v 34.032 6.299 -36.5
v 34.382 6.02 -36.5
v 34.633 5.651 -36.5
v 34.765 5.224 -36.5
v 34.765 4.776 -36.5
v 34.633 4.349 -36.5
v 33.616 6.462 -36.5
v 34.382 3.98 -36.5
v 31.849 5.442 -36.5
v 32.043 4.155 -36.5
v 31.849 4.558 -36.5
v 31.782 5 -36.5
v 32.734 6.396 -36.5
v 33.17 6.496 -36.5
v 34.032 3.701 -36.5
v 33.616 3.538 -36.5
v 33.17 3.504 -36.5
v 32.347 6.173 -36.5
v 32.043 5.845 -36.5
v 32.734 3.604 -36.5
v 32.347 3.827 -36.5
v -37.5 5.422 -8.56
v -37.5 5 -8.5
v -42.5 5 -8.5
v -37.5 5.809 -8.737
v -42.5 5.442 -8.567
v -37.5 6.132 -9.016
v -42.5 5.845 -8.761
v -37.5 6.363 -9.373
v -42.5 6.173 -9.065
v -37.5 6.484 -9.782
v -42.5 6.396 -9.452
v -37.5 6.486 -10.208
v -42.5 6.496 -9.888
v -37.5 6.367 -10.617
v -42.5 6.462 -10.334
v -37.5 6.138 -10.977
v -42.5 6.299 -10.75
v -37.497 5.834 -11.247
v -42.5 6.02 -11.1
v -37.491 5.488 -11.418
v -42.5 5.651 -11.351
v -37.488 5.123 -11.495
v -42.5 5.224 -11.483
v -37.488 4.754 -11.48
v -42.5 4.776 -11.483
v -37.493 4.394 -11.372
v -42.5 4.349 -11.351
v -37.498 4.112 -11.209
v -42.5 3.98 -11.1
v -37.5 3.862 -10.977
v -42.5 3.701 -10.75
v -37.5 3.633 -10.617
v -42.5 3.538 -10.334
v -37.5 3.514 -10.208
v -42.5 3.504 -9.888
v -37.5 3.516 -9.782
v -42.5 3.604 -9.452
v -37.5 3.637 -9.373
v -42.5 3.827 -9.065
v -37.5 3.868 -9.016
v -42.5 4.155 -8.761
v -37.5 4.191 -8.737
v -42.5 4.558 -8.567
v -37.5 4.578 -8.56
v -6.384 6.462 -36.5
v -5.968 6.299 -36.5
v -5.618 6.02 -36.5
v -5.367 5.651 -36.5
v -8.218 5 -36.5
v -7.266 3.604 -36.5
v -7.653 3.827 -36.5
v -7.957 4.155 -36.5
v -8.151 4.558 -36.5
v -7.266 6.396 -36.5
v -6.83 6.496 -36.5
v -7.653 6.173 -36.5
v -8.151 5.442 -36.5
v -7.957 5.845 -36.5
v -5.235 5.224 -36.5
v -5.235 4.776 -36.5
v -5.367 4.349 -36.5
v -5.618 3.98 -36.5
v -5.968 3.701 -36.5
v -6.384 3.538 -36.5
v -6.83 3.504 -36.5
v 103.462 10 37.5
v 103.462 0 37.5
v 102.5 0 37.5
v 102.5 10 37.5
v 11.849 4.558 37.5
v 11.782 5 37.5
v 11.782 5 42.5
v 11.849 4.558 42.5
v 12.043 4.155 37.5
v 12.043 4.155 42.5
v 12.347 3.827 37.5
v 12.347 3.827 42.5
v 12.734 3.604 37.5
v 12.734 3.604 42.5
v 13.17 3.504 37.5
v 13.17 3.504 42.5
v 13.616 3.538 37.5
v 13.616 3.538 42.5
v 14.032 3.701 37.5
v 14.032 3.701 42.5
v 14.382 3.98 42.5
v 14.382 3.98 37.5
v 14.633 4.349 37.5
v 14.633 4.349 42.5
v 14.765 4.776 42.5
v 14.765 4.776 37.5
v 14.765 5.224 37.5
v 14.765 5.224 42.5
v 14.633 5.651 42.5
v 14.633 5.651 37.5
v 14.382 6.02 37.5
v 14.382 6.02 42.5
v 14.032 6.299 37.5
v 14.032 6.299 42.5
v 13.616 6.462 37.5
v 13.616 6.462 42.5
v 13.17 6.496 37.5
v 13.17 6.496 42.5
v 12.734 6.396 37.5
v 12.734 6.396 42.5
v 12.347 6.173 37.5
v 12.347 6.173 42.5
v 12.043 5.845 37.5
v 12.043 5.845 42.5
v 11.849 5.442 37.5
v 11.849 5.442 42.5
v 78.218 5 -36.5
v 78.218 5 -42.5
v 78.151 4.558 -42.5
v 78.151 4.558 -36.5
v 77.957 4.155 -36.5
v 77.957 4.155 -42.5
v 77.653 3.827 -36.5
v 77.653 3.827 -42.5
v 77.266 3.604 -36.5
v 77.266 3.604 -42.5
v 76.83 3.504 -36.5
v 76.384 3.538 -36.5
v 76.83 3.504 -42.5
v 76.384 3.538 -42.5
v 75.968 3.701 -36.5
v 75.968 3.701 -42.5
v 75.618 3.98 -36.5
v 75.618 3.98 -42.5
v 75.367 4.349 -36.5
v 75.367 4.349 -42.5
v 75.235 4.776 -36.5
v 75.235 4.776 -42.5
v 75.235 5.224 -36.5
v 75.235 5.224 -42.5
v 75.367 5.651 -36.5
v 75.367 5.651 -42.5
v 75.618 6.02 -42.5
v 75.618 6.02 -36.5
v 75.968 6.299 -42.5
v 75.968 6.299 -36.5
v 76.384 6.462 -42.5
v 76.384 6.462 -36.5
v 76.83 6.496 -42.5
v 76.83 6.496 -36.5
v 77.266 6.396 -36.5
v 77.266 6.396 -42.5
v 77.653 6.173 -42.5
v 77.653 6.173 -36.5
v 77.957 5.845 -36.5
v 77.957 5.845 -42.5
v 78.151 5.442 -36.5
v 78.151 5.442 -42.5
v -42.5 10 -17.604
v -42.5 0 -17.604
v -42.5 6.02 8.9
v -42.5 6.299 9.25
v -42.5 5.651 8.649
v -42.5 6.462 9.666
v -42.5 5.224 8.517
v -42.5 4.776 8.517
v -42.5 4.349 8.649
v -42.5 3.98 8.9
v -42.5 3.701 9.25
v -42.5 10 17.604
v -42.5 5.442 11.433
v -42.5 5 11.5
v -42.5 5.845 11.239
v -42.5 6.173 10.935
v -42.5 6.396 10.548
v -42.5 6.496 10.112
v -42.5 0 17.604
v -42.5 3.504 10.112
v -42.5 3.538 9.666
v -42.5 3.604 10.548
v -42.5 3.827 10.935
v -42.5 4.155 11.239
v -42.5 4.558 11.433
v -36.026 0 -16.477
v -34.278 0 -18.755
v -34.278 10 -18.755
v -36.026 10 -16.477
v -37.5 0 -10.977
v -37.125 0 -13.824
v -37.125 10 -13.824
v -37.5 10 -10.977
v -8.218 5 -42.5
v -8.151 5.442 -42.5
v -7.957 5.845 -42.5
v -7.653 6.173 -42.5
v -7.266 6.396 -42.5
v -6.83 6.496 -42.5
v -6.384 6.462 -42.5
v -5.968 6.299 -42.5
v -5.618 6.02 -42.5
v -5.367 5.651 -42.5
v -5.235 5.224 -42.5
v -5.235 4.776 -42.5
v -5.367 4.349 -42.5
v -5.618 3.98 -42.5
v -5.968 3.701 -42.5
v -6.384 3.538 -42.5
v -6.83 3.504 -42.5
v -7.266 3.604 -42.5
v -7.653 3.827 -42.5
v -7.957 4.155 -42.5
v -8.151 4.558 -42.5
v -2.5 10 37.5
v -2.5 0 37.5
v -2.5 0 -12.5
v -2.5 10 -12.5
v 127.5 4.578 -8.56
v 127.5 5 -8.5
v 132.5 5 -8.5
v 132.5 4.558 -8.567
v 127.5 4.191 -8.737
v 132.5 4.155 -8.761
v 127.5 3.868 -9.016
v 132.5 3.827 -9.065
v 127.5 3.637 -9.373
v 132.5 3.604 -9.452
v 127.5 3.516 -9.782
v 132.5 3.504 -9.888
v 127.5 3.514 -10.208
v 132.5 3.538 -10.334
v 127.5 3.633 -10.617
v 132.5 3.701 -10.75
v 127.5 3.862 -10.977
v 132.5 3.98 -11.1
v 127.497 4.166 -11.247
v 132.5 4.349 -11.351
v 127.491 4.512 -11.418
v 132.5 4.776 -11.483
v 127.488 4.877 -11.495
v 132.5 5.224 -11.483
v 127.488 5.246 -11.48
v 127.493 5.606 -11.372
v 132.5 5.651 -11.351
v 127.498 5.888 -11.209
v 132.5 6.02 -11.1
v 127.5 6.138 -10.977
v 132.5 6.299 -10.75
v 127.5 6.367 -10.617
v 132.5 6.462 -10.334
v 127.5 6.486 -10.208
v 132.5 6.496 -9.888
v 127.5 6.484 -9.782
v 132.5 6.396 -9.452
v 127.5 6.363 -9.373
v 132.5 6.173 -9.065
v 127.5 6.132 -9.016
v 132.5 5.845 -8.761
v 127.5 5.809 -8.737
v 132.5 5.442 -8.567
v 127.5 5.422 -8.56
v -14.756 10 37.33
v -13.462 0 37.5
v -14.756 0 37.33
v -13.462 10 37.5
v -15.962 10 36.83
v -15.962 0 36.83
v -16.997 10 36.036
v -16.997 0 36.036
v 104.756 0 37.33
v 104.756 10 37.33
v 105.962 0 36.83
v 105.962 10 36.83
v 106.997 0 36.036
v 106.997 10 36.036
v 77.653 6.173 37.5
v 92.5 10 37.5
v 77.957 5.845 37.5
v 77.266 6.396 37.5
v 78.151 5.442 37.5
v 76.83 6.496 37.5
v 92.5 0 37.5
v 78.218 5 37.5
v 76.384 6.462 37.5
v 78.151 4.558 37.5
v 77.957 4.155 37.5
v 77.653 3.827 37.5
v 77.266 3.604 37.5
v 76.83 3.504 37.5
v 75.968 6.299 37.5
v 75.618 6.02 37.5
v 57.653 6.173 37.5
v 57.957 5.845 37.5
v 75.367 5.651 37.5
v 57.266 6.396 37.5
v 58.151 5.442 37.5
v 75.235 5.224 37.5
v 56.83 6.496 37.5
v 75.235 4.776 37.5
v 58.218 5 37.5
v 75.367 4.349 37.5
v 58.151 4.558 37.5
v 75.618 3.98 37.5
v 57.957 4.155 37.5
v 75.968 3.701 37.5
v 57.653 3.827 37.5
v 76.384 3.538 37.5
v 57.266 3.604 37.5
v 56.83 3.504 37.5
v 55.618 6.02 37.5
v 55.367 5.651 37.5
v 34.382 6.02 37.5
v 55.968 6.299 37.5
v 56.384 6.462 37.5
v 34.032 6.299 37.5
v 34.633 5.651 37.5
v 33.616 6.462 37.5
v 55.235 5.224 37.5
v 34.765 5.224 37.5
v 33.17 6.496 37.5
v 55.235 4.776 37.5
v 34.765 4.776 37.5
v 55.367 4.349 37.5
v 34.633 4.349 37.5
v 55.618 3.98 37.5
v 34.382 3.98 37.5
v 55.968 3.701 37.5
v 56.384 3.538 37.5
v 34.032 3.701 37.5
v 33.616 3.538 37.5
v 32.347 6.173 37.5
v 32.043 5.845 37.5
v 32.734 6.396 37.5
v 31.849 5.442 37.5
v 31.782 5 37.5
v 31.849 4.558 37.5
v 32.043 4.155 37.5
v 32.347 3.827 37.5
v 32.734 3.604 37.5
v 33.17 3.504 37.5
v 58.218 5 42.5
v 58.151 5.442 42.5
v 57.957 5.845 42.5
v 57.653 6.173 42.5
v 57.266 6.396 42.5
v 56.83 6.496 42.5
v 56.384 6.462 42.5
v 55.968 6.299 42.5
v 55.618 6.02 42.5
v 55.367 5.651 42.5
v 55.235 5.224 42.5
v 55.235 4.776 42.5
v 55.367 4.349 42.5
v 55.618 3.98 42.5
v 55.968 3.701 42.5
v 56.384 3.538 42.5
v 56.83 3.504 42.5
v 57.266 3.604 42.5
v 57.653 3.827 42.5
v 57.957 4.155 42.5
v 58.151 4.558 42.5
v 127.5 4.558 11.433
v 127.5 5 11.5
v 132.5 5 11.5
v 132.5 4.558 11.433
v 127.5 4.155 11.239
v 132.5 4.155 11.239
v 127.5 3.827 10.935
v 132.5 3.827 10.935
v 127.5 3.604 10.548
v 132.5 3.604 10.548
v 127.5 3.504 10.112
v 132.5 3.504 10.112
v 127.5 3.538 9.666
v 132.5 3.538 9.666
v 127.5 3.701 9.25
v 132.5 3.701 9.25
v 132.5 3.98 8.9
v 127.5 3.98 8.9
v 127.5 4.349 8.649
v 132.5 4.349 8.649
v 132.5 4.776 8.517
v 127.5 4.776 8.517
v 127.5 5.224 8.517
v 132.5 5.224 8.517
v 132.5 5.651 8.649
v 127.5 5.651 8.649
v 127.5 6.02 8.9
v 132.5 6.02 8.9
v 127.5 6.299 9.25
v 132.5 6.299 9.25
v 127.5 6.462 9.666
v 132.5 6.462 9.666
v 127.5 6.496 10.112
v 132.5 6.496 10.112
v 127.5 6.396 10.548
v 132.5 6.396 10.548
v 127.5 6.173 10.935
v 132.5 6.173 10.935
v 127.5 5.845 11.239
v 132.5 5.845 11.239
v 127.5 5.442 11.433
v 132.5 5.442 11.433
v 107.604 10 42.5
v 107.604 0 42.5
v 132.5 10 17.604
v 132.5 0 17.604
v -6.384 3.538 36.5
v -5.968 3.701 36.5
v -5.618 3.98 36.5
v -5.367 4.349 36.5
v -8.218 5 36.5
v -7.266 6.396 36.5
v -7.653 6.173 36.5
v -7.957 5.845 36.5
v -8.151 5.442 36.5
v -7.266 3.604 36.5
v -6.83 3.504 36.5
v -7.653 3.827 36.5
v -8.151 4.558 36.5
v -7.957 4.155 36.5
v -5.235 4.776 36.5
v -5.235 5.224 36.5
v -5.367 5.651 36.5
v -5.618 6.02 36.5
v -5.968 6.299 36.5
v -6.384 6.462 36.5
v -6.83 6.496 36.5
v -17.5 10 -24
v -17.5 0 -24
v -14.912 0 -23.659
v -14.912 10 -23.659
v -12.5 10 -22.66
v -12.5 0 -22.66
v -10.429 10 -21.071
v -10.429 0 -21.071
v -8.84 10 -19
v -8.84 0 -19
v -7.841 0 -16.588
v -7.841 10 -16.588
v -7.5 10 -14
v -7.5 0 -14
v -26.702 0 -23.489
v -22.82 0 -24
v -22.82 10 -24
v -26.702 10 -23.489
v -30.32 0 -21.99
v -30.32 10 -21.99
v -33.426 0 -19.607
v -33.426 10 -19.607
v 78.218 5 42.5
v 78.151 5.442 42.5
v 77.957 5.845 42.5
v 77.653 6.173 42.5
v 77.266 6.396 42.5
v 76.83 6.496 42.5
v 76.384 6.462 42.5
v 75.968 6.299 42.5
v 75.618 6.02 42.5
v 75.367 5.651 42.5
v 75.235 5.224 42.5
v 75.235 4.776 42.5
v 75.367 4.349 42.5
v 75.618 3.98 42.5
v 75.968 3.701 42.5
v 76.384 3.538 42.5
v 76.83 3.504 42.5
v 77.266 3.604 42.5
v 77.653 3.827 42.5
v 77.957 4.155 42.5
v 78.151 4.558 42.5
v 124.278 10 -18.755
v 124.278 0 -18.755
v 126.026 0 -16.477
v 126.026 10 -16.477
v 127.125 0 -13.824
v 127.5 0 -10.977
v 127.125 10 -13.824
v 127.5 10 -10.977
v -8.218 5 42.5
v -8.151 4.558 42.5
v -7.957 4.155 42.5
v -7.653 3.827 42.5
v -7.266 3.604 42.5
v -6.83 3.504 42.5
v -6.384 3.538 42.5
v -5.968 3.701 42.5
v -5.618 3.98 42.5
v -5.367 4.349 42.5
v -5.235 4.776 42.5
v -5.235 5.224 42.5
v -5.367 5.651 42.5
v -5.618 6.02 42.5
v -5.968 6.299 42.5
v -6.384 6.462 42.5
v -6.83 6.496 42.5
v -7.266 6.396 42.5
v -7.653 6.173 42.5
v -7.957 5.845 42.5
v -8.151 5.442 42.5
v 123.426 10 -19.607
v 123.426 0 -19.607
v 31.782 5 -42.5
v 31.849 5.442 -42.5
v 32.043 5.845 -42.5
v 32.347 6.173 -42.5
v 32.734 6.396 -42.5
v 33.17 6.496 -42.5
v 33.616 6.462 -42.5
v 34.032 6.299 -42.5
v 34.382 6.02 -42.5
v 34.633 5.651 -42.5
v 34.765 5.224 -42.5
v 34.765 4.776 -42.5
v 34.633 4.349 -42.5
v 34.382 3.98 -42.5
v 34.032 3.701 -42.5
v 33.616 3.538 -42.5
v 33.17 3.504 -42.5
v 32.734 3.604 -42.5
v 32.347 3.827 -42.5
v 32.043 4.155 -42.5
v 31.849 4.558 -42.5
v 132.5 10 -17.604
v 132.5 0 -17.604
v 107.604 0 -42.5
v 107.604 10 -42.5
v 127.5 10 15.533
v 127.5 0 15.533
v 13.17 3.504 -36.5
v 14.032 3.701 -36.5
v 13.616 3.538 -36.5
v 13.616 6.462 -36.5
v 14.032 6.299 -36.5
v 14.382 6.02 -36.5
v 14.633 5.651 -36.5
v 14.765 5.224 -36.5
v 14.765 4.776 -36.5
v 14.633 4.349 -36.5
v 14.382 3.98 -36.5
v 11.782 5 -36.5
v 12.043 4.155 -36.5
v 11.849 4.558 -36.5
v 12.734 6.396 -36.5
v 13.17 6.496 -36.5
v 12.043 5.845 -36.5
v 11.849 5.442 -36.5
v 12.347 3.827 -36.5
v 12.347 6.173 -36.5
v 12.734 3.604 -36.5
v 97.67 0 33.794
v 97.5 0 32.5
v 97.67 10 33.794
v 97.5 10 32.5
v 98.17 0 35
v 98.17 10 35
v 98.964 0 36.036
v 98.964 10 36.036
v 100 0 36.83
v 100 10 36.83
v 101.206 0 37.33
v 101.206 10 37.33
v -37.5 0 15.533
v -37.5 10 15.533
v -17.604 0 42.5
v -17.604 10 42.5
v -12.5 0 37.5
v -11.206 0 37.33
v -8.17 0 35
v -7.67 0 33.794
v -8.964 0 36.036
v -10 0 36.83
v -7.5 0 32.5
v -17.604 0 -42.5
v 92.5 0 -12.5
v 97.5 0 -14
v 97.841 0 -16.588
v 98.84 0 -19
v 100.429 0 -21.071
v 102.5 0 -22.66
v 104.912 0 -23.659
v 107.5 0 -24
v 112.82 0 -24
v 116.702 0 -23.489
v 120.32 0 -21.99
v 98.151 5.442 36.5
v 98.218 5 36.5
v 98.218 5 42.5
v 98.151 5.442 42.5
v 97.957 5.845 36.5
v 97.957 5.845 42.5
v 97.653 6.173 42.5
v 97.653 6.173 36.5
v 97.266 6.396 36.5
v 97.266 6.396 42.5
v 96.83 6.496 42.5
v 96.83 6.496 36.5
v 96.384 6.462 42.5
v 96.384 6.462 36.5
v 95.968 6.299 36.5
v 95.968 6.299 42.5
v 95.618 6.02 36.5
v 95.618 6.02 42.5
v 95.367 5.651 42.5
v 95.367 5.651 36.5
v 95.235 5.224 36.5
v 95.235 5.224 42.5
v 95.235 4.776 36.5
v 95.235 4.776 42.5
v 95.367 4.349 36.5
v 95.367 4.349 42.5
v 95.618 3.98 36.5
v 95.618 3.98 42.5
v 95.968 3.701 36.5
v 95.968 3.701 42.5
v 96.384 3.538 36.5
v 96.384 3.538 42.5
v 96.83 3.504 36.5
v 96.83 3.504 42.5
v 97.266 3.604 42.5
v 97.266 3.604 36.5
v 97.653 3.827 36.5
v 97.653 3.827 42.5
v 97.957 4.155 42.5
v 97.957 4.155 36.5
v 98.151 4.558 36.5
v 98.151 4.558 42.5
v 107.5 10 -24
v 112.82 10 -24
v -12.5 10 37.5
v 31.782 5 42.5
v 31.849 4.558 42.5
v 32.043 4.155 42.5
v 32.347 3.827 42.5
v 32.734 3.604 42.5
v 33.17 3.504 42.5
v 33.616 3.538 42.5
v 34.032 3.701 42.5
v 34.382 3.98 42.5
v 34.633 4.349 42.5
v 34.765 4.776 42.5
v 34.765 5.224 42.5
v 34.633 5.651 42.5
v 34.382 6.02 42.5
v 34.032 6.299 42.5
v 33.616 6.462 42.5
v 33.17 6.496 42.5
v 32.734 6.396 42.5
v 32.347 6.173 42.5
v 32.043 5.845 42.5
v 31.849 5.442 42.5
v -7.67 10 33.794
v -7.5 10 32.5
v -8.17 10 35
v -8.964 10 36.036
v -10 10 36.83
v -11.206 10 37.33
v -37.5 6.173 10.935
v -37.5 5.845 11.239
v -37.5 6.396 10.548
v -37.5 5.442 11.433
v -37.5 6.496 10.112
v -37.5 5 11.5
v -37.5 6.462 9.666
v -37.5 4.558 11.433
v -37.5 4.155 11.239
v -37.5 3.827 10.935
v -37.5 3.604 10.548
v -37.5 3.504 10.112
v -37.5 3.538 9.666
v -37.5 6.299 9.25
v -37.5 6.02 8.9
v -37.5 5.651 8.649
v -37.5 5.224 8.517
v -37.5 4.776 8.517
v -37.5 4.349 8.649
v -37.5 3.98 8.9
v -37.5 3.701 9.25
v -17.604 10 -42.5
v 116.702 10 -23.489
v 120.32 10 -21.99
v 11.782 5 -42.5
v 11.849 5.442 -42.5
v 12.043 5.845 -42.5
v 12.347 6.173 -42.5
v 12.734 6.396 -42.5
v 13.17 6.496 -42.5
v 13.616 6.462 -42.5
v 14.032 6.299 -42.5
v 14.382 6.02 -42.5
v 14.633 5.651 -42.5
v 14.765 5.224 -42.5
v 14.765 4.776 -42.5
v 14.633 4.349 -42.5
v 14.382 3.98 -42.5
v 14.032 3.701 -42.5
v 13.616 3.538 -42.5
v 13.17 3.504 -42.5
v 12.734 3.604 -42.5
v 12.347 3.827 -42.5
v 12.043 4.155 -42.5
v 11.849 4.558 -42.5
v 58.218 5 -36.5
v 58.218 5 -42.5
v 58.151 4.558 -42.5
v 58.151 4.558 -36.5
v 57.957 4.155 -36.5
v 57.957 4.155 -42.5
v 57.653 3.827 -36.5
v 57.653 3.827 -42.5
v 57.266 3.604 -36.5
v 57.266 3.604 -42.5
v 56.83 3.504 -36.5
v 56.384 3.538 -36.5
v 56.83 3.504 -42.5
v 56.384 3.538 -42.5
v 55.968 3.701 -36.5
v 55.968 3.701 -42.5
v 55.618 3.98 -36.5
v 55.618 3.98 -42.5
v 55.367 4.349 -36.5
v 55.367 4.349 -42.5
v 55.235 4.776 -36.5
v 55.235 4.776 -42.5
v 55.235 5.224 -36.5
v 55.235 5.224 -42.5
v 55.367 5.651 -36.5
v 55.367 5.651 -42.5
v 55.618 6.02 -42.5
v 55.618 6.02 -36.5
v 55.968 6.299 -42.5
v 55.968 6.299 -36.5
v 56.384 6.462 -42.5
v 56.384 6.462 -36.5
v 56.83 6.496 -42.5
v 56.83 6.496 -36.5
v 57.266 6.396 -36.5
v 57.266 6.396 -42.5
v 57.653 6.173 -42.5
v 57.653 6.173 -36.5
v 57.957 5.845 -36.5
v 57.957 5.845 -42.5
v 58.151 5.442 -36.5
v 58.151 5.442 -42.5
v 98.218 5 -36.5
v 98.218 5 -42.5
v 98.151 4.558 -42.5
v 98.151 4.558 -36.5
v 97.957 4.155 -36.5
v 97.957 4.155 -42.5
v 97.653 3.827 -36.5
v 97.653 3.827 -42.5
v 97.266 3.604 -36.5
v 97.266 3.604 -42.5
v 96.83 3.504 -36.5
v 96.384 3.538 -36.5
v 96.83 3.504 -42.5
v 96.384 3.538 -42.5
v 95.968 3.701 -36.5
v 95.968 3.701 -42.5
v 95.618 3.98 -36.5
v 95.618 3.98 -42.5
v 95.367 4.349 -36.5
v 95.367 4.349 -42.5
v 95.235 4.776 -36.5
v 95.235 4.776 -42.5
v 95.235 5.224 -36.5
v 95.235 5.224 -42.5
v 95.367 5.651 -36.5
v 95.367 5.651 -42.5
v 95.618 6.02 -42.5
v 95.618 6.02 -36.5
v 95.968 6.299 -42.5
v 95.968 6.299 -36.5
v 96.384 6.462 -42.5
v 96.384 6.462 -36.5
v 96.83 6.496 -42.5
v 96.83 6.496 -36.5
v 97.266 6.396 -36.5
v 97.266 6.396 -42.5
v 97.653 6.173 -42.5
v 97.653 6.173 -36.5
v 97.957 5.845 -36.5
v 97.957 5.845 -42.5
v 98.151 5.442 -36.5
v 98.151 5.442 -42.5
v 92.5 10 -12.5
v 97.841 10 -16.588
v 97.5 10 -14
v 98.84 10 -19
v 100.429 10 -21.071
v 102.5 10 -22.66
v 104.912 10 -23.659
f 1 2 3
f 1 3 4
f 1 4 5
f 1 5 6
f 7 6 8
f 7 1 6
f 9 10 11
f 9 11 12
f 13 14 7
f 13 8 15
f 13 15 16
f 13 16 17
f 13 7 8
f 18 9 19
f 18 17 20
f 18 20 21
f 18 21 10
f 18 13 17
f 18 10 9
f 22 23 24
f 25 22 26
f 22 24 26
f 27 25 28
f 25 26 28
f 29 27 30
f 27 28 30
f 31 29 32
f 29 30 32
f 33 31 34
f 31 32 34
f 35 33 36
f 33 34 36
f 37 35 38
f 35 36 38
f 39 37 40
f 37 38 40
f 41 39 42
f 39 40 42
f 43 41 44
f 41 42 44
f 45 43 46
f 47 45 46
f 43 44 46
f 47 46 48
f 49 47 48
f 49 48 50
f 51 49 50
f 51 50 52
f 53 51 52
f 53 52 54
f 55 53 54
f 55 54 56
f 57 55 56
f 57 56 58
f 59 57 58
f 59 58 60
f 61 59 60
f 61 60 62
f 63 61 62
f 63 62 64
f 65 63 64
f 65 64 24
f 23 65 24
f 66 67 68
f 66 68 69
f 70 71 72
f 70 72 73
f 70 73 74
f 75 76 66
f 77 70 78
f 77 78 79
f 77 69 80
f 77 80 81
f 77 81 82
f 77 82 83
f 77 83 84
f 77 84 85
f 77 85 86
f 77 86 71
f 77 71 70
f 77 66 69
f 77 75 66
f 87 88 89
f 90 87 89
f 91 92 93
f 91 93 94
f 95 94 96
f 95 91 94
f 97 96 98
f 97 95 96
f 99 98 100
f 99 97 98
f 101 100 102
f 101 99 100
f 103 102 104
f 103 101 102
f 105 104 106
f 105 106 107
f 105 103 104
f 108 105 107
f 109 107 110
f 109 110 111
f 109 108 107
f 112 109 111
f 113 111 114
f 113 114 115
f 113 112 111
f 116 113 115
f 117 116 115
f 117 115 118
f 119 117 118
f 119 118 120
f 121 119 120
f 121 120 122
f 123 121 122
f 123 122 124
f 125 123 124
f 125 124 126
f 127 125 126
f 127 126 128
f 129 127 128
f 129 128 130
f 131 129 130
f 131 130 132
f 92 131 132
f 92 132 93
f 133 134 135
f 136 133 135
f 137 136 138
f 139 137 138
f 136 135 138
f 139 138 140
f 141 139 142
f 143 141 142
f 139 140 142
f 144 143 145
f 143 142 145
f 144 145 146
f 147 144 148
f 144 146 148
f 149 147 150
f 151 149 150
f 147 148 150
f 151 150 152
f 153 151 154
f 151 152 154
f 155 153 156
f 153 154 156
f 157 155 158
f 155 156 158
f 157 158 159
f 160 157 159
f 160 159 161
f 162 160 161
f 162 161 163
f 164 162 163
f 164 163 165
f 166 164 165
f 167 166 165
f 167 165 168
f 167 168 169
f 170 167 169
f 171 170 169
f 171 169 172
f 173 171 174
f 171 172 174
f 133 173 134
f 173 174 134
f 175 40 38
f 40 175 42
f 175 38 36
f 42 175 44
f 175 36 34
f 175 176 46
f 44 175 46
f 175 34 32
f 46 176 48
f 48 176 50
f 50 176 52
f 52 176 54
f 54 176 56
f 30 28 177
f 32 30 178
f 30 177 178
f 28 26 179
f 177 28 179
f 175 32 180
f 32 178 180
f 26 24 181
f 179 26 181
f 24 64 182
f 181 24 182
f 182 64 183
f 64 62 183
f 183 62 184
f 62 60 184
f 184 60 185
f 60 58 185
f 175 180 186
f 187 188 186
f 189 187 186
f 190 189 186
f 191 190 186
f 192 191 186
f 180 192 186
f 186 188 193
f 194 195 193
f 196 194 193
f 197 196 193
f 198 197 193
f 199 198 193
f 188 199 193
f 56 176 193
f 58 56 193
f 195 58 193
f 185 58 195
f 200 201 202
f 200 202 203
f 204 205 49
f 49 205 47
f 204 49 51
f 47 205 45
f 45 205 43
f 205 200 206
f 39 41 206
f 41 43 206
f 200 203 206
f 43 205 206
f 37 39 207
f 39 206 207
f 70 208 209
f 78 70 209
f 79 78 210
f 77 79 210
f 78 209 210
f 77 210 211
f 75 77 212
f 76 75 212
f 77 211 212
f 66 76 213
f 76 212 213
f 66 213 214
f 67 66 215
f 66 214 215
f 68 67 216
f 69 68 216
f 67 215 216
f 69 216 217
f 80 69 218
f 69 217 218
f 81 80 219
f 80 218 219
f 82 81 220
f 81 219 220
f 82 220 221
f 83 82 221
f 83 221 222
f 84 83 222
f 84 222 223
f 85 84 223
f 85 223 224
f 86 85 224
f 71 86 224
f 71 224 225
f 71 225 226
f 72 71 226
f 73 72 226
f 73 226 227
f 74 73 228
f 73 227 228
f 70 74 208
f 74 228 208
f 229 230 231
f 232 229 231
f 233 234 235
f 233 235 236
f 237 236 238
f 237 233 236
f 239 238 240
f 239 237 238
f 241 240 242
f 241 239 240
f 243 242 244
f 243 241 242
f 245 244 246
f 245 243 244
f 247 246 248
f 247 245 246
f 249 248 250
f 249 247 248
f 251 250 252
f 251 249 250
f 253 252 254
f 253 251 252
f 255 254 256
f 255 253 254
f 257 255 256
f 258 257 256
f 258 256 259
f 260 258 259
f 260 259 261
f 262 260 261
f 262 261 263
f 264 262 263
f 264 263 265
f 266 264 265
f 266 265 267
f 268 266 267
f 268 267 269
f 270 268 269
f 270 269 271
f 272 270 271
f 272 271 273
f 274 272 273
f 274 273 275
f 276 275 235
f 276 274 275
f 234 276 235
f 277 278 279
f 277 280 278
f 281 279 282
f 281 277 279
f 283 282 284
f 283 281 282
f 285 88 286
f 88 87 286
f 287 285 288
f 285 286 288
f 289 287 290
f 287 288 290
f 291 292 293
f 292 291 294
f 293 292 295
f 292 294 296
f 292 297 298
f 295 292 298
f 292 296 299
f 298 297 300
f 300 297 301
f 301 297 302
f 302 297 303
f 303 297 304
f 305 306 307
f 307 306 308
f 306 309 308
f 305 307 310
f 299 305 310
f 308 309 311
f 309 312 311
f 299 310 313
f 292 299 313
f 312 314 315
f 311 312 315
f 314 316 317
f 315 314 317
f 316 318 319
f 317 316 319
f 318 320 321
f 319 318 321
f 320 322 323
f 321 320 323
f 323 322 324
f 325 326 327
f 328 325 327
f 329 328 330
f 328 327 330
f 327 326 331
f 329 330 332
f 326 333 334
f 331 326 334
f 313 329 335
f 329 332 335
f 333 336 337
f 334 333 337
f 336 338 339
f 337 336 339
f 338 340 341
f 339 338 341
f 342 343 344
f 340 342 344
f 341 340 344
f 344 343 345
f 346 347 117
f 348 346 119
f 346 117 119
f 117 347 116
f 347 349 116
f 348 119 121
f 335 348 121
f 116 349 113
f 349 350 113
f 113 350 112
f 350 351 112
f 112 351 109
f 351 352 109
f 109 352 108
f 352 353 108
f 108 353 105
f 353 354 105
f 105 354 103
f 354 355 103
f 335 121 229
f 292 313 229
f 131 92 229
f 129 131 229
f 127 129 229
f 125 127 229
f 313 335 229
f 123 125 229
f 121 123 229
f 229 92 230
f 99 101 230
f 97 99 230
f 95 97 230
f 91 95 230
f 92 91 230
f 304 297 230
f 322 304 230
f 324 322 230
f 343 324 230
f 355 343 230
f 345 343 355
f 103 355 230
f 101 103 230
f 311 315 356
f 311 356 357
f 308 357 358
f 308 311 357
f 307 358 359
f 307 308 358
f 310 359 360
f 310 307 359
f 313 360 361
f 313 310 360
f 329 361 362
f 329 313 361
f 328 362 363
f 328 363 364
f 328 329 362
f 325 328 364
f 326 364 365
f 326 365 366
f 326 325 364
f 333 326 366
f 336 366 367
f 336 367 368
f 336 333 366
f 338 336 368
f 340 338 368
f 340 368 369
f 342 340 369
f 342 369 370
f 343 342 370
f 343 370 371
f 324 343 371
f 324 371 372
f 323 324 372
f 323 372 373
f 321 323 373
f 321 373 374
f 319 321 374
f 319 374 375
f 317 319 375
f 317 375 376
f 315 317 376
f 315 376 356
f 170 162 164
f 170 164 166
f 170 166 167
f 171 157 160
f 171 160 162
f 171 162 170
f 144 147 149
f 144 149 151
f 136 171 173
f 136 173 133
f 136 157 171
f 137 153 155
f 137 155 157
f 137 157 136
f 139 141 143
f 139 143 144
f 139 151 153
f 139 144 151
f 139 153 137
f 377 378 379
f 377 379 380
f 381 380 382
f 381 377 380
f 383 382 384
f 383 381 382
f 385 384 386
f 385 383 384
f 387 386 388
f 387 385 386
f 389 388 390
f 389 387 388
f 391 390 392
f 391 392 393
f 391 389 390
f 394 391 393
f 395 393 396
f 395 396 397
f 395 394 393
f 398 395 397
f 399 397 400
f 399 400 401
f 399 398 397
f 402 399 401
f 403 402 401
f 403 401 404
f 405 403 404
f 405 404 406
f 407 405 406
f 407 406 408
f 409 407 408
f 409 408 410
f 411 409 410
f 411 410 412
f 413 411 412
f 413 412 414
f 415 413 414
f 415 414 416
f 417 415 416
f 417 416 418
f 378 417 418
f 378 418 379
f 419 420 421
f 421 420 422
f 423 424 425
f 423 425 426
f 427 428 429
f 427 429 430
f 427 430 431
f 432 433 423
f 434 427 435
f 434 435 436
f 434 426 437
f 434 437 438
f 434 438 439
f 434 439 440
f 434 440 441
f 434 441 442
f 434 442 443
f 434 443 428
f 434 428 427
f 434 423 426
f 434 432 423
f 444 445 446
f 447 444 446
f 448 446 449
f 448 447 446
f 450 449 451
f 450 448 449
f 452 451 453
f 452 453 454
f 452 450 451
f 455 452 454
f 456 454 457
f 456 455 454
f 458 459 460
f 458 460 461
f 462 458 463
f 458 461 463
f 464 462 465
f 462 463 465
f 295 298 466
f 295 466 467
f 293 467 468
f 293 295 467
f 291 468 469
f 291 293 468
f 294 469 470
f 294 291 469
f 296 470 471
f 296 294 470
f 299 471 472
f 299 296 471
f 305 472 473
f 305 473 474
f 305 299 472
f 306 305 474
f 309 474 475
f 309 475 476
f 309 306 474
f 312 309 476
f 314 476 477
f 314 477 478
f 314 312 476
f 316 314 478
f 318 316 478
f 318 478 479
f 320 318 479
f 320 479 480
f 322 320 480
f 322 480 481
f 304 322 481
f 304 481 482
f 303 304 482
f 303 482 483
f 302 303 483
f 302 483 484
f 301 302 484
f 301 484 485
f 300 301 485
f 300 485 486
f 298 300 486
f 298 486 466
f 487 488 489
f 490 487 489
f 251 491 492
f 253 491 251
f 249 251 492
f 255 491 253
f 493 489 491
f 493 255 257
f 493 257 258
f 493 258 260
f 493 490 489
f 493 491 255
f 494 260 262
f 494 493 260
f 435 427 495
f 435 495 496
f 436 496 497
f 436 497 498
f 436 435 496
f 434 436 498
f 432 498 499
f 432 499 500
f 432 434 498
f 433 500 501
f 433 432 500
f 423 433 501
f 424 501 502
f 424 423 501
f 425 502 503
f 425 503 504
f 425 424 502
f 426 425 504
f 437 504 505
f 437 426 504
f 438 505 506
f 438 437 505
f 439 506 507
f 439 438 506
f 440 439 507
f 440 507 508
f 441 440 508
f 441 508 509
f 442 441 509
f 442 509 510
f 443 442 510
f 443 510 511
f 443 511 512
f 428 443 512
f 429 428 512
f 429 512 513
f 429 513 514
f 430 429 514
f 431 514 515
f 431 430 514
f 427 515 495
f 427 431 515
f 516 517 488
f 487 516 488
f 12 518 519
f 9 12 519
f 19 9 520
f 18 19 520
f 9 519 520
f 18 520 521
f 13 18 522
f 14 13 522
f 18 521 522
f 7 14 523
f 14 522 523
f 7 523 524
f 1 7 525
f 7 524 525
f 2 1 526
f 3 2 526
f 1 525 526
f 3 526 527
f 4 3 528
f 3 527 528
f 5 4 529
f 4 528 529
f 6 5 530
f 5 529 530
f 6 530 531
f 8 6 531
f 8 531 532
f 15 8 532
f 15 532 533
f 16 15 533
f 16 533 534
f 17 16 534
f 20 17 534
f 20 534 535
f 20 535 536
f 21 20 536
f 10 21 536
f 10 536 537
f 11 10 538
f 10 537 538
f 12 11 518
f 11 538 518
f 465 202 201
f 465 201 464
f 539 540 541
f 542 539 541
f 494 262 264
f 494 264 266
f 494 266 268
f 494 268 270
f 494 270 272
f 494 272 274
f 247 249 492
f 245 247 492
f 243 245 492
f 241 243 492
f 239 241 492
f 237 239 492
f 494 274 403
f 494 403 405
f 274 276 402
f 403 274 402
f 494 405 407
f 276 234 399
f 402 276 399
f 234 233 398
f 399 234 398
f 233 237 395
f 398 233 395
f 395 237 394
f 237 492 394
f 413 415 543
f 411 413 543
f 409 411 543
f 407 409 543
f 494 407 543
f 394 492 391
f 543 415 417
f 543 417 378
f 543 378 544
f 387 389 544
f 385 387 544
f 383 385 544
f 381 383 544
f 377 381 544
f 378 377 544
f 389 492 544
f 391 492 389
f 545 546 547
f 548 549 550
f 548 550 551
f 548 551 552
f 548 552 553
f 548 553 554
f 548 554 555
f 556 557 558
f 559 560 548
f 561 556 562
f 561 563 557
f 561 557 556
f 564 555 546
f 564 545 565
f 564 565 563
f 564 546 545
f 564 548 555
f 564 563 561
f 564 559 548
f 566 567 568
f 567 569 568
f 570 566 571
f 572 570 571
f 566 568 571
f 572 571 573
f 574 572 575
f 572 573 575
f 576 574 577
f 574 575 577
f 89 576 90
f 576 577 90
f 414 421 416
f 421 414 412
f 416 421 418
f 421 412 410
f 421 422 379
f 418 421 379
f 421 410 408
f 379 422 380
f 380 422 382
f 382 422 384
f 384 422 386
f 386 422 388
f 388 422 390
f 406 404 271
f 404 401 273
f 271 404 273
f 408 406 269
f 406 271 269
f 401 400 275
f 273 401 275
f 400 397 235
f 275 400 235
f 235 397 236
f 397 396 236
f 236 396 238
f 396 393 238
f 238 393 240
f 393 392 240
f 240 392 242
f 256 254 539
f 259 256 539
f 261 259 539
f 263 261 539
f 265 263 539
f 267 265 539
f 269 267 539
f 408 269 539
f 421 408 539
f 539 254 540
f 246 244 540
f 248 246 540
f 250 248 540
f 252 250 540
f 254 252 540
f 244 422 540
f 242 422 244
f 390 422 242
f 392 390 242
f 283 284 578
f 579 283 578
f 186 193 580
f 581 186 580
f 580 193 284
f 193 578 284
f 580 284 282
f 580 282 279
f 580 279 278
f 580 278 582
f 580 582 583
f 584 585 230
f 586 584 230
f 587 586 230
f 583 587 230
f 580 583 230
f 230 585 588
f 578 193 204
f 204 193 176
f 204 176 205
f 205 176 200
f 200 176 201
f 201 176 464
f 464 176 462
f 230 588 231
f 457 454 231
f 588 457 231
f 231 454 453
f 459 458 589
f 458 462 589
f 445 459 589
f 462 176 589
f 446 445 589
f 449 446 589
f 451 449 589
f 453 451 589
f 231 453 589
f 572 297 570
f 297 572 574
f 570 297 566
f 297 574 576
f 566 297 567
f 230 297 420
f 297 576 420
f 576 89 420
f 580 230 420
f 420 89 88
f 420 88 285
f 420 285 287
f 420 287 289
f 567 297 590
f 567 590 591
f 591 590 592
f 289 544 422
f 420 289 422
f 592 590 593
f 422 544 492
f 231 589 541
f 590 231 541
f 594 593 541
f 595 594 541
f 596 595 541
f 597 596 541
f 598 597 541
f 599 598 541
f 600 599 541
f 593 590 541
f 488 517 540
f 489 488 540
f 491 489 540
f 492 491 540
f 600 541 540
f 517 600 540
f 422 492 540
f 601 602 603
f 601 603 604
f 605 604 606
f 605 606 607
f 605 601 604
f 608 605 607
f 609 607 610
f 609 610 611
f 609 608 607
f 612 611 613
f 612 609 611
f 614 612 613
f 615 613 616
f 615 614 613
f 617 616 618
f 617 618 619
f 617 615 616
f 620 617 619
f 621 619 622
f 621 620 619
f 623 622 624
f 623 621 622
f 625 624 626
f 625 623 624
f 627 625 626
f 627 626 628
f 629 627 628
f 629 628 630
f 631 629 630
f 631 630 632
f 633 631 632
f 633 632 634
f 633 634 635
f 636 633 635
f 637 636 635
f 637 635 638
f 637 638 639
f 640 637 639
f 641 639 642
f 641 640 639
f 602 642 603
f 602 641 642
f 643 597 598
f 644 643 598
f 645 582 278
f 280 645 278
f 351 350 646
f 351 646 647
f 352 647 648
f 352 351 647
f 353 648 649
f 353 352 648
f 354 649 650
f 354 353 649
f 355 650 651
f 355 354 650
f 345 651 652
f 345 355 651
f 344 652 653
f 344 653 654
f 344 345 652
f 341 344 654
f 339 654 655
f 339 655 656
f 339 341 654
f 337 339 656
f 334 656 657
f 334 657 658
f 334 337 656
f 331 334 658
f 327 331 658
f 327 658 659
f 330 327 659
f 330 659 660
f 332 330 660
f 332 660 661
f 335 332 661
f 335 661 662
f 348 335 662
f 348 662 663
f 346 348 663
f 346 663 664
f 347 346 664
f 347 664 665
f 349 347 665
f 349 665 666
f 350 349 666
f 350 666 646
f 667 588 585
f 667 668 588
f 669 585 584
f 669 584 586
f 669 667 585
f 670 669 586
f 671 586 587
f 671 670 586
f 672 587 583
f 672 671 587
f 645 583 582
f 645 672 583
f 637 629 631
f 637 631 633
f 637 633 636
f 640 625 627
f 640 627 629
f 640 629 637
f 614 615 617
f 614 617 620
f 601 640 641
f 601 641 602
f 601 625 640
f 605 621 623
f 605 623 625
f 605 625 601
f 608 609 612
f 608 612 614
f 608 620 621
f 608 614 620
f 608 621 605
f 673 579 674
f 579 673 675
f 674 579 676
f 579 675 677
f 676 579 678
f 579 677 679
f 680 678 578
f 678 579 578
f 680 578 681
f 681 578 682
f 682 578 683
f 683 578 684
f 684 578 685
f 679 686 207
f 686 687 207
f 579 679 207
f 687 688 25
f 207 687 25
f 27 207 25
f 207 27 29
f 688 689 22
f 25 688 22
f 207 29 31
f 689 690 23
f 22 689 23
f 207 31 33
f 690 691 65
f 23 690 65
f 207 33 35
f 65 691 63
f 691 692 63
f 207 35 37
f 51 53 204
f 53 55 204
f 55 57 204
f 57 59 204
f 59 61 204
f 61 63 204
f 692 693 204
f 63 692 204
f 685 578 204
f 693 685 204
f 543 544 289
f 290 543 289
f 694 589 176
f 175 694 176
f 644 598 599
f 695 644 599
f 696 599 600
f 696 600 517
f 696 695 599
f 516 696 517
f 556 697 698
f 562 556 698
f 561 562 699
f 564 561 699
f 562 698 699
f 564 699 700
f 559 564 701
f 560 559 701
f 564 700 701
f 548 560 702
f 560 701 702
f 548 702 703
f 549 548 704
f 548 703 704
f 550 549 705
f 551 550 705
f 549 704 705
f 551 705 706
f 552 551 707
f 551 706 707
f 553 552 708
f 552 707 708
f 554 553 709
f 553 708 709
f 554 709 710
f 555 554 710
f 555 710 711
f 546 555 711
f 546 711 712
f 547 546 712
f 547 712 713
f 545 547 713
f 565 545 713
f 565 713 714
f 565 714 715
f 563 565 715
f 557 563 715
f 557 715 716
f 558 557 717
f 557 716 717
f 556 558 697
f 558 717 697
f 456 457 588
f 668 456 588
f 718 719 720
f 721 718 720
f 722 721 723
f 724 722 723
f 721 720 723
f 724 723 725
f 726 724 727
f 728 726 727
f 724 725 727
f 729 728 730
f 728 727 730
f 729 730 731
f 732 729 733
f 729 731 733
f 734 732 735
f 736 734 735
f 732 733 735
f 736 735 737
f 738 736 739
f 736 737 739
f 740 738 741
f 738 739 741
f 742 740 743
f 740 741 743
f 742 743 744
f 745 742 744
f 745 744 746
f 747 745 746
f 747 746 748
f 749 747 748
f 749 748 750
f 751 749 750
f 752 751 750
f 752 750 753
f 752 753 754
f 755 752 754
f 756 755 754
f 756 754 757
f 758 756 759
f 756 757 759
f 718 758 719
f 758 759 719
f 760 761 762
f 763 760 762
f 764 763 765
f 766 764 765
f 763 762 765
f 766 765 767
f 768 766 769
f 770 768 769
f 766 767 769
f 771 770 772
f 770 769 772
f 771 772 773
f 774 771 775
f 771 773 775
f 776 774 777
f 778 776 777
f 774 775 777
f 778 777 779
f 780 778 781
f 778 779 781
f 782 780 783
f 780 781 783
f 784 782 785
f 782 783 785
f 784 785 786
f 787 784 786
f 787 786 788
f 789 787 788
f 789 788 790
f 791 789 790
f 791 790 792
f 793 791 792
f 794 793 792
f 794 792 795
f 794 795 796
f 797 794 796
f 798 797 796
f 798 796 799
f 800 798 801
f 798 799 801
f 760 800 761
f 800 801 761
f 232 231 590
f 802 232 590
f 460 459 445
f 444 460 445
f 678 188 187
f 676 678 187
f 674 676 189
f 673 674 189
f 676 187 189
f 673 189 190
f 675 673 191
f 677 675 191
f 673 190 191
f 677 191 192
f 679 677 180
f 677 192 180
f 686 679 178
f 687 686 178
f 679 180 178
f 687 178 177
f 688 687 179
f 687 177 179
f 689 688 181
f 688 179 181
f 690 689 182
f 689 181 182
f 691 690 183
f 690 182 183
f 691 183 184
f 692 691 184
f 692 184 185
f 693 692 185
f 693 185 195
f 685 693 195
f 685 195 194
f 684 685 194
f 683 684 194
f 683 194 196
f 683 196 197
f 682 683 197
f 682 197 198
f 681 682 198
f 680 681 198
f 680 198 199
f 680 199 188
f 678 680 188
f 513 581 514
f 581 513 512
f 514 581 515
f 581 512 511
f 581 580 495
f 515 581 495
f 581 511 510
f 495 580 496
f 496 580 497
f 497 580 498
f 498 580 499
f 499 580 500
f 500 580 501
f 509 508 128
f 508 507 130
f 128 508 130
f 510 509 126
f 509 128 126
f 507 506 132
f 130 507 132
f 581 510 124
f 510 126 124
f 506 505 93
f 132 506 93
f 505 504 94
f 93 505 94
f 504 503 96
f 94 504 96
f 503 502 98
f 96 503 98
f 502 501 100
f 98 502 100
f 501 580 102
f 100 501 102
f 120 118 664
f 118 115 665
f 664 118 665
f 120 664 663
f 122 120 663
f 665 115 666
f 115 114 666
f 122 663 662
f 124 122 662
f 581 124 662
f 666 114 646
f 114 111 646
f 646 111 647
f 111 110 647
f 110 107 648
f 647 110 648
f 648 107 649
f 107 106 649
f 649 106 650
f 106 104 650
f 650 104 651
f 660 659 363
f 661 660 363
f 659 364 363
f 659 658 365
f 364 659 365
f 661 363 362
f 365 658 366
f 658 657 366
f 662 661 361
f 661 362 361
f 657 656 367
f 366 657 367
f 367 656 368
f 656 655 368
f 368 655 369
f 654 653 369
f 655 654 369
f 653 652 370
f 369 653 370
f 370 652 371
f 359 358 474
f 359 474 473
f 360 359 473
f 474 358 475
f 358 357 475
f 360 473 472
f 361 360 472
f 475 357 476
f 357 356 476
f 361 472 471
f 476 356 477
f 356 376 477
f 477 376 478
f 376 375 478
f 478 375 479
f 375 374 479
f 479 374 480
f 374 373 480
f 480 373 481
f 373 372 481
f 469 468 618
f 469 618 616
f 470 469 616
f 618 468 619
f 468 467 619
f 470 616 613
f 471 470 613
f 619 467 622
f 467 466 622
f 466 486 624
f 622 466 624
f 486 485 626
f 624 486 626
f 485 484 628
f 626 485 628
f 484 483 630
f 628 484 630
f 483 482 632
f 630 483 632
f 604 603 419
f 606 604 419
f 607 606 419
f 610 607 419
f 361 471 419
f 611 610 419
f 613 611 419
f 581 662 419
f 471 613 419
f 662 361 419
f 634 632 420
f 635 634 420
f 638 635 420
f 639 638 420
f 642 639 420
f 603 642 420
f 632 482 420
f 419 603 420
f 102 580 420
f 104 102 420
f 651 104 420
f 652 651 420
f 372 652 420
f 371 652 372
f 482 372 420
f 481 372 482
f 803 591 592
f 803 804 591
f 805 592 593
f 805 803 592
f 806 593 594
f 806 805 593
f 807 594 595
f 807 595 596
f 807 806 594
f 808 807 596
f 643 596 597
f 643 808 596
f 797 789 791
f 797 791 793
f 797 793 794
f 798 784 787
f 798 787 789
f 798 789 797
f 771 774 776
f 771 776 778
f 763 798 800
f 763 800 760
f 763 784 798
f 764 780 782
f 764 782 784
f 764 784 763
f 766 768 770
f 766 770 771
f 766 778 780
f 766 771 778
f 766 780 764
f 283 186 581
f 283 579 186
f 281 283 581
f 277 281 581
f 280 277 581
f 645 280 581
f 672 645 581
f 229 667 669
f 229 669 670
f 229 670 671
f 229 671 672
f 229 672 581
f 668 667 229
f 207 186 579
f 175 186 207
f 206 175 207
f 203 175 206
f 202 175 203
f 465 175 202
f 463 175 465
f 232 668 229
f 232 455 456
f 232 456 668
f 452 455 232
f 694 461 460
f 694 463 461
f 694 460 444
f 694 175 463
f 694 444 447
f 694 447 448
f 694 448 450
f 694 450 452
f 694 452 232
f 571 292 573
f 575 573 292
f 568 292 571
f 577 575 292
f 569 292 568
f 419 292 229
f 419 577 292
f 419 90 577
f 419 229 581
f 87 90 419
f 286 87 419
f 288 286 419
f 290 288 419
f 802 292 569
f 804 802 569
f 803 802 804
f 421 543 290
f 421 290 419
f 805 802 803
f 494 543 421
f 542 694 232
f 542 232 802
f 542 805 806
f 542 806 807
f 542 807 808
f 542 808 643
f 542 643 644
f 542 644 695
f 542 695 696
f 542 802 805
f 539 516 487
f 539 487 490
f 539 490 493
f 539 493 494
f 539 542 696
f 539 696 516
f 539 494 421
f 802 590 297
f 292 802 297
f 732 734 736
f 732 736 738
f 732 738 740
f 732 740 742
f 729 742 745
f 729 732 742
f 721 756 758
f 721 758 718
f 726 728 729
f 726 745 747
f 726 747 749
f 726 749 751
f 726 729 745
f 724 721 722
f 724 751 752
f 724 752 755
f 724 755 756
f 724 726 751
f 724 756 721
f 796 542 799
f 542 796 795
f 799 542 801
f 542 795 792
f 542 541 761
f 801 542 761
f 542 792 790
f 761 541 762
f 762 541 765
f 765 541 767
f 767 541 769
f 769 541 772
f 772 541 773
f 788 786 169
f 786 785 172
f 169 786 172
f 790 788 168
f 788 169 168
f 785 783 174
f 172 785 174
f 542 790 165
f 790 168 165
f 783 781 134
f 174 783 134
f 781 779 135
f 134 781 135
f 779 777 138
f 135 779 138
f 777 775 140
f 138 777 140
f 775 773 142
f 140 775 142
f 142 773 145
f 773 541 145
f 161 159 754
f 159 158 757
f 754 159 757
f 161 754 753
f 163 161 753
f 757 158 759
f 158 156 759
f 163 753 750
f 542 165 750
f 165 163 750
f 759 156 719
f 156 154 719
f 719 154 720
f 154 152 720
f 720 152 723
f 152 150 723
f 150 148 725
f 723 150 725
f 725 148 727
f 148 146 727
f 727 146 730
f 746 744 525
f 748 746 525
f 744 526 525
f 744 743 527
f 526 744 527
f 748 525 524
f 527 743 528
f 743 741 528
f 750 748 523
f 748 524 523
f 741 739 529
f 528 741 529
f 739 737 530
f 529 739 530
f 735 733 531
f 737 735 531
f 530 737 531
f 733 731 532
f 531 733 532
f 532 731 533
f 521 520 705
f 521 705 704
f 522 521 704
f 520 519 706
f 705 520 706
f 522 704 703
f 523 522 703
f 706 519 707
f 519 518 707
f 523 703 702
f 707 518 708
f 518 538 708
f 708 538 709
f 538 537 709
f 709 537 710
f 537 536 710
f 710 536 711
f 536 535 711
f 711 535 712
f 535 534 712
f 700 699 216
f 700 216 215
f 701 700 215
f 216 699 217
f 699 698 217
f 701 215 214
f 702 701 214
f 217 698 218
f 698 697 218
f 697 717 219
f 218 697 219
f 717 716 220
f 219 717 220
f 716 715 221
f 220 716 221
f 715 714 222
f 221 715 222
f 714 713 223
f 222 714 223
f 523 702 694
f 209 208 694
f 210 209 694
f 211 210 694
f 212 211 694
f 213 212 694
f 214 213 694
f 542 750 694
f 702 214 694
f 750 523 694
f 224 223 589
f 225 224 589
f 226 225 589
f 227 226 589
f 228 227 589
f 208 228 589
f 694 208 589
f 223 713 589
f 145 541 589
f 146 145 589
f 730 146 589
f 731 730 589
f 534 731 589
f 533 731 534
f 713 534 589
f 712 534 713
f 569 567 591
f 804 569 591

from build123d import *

# Parameters (mm, degrees)
EXTRUDE_1_DEPTH     = 10
FILLET_1_R          = 10
FILLET_11_R         = 5
FILLET_21_R         = 15
FILLET_24_R         = 11
SKETCH_5_R          = 1.5
CUT_EXTRUDE_1_DEPTH = 6
SKETCH_2_R          = 1.5
CUT_EXTRUDE_2_DEPTH = 6
CUT_EXTRUDE_START   = -6
SKETCH_3_R          = 1.5
CUT_EXTRUDE_3_DEPTH = 6
SKETCH_4_R          = 1.5
CUT_EXTRUDE_4_DEPTH = 6


with BuildPart() as part:
    # 草图1 → 凸台-拉伸1 (new body)
    with BuildSketch(Plane(origin=(0, 0, 0), x_dir=(1, 0, 0), z_dir=(0, 1, 0))):
        Polygon((73.431457505, 42.5), (16.568542495, 42.5), (-17.604076401, 42.5), (-42.5, 17.604076401), (-42.5, -17.604076401), (-17.604076401, -42.5), (16.568542495, -42.5), (73.431457505, -42.5), (107.604076401, -42.5), (132.5, -17.604076401), (132.5, 17.604076401), (107.604076401, 42.5), align=None)
        Polygon((-37.5, 15.533008589), (-29.033008589, 24), (-7.5, 24), (-7.5, -37.5), (-15.533008589, -37.5), (-37.5, -15.533008589), align=None, mode=Mode.SUBTRACT)
        Polygon((19.068542495, -37.5), (16.568542495, -37.5), (6.858116823, -37.5), (-2.5, -37.5), (-2.5, -28), (-2.5, 12.5), (92.5, 12.5), (92.5, -28), (92.5, -37.5), (83.141883177, -37.5), (73.431457505, -37.5), align=None, mode=Mode.SUBTRACT)
        Polygon((97.5, 24), (119.033008589, 24), (127.5, 15.533008589), (127.5, -15.533008589), (105.533008589, -37.5), (97.5, -37.5), align=None, mode=Mode.SUBTRACT)
    extrude(amount=EXTRUDE_1_DEPTH)

    # 圆角1
    fillet_1_edges = [part.edges().sort_by_distance(p)[0] for p in [
        (-7.5, 5, -24),
        (97.5, 5, -24),
    ]]
    fillet(fillet_1_edges, radius=FILLET_1_R)

    # 圆角11
    fillet_11_edges = [part.edges().sort_by_distance(p)[0] for p in [
        (-15.533008589, 5, 37.5),
        (-7.5, 5, 37.5),
        (97.5, 5, 37.5),
        (105.533008589, 5, 37.5),
    ]]
    fillet(fillet_11_edges, radius=FILLET_11_R)

    # 圆角21
    fillet_21_edges = [part.edges().sort_by_distance(p)[0] for p in [
        (-29.033008589, 5, -24),
        (119.033008589, 5, -24),
    ]]
    fillet(fillet_21_edges, radius=FILLET_21_R)

    # 圆角24
    fillet_24_edges = [part.edges().sort_by_distance(p)[0] for p in [
        (-37.5, 5, -15.533008589),
        (127.5, 5, -15.533008589),
    ]]
    fillet(fillet_24_edges, radius=FILLET_24_R)

    # 草图5 → 切除-拉伸1 (cut)
    with BuildSketch(Plane.ZY.offset(42.5)):
        with Locations((10, 5)):
            Circle(SKETCH_5_R)
        with Locations((-10, 5)):
            Circle(SKETCH_5_R)
    extrude(amount=-CUT_EXTRUDE_1_DEPTH, mode=Mode.SUBTRACT)

    # 草图2 → 切除-拉伸2 (cut)
    with BuildSketch(Plane(origin=(0, 0, -42.5), x_dir=(-1, 0, 0), z_dir=(0, 0, -1))):
        with Locations((-33.281955929, 5)):
            Circle(SKETCH_2_R)
        with Locations((-13.281955929, 5)):
            Circle(SKETCH_2_R)
        with Locations((6.718044071, 5)):
            Circle(SKETCH_2_R)
        with Locations(Location((-96.718044071, 5, 0), (0, 0, 180))):
            Circle(SKETCH_2_R)
        with Locations(Location((-76.718044071, 5, 0), (0, 0, 180))):
            Circle(SKETCH_2_R)
        with Locations(Location((-56.718044071, 5, 0), (0, 0, 180))):
            Circle(SKETCH_2_R)
    extrude(amount=-CUT_EXTRUDE_2_DEPTH, mode=Mode.SUBTRACT)

    # 草图3 → 切除-拉伸3 (cut)
    with BuildSketch(Plane(origin=(132.5, 0, 0), x_dir=(0, 0, -1), z_dir=(1, 0, 0)).offset(CUT_EXTRUDE_START)):
        with Locations(Location((10, 5, 0), (0, 0, 180))):
            Circle(SKETCH_3_R)
        with Locations(Location((-10, 5, 0), (0, 0, 180))):
            Circle(SKETCH_3_R)
    extrude(amount=CUT_EXTRUDE_3_DEPTH, mode=Mode.SUBTRACT)

    # 草图4 → 切除-拉伸4 (cut)
    with BuildSketch(Plane.XY.offset(42.5).offset(CUT_EXTRUDE_START)):
        with Locations((56.718044071, 5)):
            Circle(SKETCH_4_R)
        with Locations((76.718044071, 5)):
            Circle(SKETCH_4_R)
        with Locations((96.718044071, 5)):
            Circle(SKETCH_4_R)
        with Locations(Location((33.281955929, 5, 0), (0, 0, 180))):
            Circle(SKETCH_4_R)
        with Locations(Location((13.281955929, 5, 0), (0, 0, 180))):
            Circle(SKETCH_4_R)
        with Locations(Location((-6.718044071, 5, 0), (0, 0, 180))):
            Circle(SKETCH_4_R)
    extrude(amount=CUT_EXTRUDE_4_DEPTH, mode=Mode.SUBTRACT)


solid = part.part
